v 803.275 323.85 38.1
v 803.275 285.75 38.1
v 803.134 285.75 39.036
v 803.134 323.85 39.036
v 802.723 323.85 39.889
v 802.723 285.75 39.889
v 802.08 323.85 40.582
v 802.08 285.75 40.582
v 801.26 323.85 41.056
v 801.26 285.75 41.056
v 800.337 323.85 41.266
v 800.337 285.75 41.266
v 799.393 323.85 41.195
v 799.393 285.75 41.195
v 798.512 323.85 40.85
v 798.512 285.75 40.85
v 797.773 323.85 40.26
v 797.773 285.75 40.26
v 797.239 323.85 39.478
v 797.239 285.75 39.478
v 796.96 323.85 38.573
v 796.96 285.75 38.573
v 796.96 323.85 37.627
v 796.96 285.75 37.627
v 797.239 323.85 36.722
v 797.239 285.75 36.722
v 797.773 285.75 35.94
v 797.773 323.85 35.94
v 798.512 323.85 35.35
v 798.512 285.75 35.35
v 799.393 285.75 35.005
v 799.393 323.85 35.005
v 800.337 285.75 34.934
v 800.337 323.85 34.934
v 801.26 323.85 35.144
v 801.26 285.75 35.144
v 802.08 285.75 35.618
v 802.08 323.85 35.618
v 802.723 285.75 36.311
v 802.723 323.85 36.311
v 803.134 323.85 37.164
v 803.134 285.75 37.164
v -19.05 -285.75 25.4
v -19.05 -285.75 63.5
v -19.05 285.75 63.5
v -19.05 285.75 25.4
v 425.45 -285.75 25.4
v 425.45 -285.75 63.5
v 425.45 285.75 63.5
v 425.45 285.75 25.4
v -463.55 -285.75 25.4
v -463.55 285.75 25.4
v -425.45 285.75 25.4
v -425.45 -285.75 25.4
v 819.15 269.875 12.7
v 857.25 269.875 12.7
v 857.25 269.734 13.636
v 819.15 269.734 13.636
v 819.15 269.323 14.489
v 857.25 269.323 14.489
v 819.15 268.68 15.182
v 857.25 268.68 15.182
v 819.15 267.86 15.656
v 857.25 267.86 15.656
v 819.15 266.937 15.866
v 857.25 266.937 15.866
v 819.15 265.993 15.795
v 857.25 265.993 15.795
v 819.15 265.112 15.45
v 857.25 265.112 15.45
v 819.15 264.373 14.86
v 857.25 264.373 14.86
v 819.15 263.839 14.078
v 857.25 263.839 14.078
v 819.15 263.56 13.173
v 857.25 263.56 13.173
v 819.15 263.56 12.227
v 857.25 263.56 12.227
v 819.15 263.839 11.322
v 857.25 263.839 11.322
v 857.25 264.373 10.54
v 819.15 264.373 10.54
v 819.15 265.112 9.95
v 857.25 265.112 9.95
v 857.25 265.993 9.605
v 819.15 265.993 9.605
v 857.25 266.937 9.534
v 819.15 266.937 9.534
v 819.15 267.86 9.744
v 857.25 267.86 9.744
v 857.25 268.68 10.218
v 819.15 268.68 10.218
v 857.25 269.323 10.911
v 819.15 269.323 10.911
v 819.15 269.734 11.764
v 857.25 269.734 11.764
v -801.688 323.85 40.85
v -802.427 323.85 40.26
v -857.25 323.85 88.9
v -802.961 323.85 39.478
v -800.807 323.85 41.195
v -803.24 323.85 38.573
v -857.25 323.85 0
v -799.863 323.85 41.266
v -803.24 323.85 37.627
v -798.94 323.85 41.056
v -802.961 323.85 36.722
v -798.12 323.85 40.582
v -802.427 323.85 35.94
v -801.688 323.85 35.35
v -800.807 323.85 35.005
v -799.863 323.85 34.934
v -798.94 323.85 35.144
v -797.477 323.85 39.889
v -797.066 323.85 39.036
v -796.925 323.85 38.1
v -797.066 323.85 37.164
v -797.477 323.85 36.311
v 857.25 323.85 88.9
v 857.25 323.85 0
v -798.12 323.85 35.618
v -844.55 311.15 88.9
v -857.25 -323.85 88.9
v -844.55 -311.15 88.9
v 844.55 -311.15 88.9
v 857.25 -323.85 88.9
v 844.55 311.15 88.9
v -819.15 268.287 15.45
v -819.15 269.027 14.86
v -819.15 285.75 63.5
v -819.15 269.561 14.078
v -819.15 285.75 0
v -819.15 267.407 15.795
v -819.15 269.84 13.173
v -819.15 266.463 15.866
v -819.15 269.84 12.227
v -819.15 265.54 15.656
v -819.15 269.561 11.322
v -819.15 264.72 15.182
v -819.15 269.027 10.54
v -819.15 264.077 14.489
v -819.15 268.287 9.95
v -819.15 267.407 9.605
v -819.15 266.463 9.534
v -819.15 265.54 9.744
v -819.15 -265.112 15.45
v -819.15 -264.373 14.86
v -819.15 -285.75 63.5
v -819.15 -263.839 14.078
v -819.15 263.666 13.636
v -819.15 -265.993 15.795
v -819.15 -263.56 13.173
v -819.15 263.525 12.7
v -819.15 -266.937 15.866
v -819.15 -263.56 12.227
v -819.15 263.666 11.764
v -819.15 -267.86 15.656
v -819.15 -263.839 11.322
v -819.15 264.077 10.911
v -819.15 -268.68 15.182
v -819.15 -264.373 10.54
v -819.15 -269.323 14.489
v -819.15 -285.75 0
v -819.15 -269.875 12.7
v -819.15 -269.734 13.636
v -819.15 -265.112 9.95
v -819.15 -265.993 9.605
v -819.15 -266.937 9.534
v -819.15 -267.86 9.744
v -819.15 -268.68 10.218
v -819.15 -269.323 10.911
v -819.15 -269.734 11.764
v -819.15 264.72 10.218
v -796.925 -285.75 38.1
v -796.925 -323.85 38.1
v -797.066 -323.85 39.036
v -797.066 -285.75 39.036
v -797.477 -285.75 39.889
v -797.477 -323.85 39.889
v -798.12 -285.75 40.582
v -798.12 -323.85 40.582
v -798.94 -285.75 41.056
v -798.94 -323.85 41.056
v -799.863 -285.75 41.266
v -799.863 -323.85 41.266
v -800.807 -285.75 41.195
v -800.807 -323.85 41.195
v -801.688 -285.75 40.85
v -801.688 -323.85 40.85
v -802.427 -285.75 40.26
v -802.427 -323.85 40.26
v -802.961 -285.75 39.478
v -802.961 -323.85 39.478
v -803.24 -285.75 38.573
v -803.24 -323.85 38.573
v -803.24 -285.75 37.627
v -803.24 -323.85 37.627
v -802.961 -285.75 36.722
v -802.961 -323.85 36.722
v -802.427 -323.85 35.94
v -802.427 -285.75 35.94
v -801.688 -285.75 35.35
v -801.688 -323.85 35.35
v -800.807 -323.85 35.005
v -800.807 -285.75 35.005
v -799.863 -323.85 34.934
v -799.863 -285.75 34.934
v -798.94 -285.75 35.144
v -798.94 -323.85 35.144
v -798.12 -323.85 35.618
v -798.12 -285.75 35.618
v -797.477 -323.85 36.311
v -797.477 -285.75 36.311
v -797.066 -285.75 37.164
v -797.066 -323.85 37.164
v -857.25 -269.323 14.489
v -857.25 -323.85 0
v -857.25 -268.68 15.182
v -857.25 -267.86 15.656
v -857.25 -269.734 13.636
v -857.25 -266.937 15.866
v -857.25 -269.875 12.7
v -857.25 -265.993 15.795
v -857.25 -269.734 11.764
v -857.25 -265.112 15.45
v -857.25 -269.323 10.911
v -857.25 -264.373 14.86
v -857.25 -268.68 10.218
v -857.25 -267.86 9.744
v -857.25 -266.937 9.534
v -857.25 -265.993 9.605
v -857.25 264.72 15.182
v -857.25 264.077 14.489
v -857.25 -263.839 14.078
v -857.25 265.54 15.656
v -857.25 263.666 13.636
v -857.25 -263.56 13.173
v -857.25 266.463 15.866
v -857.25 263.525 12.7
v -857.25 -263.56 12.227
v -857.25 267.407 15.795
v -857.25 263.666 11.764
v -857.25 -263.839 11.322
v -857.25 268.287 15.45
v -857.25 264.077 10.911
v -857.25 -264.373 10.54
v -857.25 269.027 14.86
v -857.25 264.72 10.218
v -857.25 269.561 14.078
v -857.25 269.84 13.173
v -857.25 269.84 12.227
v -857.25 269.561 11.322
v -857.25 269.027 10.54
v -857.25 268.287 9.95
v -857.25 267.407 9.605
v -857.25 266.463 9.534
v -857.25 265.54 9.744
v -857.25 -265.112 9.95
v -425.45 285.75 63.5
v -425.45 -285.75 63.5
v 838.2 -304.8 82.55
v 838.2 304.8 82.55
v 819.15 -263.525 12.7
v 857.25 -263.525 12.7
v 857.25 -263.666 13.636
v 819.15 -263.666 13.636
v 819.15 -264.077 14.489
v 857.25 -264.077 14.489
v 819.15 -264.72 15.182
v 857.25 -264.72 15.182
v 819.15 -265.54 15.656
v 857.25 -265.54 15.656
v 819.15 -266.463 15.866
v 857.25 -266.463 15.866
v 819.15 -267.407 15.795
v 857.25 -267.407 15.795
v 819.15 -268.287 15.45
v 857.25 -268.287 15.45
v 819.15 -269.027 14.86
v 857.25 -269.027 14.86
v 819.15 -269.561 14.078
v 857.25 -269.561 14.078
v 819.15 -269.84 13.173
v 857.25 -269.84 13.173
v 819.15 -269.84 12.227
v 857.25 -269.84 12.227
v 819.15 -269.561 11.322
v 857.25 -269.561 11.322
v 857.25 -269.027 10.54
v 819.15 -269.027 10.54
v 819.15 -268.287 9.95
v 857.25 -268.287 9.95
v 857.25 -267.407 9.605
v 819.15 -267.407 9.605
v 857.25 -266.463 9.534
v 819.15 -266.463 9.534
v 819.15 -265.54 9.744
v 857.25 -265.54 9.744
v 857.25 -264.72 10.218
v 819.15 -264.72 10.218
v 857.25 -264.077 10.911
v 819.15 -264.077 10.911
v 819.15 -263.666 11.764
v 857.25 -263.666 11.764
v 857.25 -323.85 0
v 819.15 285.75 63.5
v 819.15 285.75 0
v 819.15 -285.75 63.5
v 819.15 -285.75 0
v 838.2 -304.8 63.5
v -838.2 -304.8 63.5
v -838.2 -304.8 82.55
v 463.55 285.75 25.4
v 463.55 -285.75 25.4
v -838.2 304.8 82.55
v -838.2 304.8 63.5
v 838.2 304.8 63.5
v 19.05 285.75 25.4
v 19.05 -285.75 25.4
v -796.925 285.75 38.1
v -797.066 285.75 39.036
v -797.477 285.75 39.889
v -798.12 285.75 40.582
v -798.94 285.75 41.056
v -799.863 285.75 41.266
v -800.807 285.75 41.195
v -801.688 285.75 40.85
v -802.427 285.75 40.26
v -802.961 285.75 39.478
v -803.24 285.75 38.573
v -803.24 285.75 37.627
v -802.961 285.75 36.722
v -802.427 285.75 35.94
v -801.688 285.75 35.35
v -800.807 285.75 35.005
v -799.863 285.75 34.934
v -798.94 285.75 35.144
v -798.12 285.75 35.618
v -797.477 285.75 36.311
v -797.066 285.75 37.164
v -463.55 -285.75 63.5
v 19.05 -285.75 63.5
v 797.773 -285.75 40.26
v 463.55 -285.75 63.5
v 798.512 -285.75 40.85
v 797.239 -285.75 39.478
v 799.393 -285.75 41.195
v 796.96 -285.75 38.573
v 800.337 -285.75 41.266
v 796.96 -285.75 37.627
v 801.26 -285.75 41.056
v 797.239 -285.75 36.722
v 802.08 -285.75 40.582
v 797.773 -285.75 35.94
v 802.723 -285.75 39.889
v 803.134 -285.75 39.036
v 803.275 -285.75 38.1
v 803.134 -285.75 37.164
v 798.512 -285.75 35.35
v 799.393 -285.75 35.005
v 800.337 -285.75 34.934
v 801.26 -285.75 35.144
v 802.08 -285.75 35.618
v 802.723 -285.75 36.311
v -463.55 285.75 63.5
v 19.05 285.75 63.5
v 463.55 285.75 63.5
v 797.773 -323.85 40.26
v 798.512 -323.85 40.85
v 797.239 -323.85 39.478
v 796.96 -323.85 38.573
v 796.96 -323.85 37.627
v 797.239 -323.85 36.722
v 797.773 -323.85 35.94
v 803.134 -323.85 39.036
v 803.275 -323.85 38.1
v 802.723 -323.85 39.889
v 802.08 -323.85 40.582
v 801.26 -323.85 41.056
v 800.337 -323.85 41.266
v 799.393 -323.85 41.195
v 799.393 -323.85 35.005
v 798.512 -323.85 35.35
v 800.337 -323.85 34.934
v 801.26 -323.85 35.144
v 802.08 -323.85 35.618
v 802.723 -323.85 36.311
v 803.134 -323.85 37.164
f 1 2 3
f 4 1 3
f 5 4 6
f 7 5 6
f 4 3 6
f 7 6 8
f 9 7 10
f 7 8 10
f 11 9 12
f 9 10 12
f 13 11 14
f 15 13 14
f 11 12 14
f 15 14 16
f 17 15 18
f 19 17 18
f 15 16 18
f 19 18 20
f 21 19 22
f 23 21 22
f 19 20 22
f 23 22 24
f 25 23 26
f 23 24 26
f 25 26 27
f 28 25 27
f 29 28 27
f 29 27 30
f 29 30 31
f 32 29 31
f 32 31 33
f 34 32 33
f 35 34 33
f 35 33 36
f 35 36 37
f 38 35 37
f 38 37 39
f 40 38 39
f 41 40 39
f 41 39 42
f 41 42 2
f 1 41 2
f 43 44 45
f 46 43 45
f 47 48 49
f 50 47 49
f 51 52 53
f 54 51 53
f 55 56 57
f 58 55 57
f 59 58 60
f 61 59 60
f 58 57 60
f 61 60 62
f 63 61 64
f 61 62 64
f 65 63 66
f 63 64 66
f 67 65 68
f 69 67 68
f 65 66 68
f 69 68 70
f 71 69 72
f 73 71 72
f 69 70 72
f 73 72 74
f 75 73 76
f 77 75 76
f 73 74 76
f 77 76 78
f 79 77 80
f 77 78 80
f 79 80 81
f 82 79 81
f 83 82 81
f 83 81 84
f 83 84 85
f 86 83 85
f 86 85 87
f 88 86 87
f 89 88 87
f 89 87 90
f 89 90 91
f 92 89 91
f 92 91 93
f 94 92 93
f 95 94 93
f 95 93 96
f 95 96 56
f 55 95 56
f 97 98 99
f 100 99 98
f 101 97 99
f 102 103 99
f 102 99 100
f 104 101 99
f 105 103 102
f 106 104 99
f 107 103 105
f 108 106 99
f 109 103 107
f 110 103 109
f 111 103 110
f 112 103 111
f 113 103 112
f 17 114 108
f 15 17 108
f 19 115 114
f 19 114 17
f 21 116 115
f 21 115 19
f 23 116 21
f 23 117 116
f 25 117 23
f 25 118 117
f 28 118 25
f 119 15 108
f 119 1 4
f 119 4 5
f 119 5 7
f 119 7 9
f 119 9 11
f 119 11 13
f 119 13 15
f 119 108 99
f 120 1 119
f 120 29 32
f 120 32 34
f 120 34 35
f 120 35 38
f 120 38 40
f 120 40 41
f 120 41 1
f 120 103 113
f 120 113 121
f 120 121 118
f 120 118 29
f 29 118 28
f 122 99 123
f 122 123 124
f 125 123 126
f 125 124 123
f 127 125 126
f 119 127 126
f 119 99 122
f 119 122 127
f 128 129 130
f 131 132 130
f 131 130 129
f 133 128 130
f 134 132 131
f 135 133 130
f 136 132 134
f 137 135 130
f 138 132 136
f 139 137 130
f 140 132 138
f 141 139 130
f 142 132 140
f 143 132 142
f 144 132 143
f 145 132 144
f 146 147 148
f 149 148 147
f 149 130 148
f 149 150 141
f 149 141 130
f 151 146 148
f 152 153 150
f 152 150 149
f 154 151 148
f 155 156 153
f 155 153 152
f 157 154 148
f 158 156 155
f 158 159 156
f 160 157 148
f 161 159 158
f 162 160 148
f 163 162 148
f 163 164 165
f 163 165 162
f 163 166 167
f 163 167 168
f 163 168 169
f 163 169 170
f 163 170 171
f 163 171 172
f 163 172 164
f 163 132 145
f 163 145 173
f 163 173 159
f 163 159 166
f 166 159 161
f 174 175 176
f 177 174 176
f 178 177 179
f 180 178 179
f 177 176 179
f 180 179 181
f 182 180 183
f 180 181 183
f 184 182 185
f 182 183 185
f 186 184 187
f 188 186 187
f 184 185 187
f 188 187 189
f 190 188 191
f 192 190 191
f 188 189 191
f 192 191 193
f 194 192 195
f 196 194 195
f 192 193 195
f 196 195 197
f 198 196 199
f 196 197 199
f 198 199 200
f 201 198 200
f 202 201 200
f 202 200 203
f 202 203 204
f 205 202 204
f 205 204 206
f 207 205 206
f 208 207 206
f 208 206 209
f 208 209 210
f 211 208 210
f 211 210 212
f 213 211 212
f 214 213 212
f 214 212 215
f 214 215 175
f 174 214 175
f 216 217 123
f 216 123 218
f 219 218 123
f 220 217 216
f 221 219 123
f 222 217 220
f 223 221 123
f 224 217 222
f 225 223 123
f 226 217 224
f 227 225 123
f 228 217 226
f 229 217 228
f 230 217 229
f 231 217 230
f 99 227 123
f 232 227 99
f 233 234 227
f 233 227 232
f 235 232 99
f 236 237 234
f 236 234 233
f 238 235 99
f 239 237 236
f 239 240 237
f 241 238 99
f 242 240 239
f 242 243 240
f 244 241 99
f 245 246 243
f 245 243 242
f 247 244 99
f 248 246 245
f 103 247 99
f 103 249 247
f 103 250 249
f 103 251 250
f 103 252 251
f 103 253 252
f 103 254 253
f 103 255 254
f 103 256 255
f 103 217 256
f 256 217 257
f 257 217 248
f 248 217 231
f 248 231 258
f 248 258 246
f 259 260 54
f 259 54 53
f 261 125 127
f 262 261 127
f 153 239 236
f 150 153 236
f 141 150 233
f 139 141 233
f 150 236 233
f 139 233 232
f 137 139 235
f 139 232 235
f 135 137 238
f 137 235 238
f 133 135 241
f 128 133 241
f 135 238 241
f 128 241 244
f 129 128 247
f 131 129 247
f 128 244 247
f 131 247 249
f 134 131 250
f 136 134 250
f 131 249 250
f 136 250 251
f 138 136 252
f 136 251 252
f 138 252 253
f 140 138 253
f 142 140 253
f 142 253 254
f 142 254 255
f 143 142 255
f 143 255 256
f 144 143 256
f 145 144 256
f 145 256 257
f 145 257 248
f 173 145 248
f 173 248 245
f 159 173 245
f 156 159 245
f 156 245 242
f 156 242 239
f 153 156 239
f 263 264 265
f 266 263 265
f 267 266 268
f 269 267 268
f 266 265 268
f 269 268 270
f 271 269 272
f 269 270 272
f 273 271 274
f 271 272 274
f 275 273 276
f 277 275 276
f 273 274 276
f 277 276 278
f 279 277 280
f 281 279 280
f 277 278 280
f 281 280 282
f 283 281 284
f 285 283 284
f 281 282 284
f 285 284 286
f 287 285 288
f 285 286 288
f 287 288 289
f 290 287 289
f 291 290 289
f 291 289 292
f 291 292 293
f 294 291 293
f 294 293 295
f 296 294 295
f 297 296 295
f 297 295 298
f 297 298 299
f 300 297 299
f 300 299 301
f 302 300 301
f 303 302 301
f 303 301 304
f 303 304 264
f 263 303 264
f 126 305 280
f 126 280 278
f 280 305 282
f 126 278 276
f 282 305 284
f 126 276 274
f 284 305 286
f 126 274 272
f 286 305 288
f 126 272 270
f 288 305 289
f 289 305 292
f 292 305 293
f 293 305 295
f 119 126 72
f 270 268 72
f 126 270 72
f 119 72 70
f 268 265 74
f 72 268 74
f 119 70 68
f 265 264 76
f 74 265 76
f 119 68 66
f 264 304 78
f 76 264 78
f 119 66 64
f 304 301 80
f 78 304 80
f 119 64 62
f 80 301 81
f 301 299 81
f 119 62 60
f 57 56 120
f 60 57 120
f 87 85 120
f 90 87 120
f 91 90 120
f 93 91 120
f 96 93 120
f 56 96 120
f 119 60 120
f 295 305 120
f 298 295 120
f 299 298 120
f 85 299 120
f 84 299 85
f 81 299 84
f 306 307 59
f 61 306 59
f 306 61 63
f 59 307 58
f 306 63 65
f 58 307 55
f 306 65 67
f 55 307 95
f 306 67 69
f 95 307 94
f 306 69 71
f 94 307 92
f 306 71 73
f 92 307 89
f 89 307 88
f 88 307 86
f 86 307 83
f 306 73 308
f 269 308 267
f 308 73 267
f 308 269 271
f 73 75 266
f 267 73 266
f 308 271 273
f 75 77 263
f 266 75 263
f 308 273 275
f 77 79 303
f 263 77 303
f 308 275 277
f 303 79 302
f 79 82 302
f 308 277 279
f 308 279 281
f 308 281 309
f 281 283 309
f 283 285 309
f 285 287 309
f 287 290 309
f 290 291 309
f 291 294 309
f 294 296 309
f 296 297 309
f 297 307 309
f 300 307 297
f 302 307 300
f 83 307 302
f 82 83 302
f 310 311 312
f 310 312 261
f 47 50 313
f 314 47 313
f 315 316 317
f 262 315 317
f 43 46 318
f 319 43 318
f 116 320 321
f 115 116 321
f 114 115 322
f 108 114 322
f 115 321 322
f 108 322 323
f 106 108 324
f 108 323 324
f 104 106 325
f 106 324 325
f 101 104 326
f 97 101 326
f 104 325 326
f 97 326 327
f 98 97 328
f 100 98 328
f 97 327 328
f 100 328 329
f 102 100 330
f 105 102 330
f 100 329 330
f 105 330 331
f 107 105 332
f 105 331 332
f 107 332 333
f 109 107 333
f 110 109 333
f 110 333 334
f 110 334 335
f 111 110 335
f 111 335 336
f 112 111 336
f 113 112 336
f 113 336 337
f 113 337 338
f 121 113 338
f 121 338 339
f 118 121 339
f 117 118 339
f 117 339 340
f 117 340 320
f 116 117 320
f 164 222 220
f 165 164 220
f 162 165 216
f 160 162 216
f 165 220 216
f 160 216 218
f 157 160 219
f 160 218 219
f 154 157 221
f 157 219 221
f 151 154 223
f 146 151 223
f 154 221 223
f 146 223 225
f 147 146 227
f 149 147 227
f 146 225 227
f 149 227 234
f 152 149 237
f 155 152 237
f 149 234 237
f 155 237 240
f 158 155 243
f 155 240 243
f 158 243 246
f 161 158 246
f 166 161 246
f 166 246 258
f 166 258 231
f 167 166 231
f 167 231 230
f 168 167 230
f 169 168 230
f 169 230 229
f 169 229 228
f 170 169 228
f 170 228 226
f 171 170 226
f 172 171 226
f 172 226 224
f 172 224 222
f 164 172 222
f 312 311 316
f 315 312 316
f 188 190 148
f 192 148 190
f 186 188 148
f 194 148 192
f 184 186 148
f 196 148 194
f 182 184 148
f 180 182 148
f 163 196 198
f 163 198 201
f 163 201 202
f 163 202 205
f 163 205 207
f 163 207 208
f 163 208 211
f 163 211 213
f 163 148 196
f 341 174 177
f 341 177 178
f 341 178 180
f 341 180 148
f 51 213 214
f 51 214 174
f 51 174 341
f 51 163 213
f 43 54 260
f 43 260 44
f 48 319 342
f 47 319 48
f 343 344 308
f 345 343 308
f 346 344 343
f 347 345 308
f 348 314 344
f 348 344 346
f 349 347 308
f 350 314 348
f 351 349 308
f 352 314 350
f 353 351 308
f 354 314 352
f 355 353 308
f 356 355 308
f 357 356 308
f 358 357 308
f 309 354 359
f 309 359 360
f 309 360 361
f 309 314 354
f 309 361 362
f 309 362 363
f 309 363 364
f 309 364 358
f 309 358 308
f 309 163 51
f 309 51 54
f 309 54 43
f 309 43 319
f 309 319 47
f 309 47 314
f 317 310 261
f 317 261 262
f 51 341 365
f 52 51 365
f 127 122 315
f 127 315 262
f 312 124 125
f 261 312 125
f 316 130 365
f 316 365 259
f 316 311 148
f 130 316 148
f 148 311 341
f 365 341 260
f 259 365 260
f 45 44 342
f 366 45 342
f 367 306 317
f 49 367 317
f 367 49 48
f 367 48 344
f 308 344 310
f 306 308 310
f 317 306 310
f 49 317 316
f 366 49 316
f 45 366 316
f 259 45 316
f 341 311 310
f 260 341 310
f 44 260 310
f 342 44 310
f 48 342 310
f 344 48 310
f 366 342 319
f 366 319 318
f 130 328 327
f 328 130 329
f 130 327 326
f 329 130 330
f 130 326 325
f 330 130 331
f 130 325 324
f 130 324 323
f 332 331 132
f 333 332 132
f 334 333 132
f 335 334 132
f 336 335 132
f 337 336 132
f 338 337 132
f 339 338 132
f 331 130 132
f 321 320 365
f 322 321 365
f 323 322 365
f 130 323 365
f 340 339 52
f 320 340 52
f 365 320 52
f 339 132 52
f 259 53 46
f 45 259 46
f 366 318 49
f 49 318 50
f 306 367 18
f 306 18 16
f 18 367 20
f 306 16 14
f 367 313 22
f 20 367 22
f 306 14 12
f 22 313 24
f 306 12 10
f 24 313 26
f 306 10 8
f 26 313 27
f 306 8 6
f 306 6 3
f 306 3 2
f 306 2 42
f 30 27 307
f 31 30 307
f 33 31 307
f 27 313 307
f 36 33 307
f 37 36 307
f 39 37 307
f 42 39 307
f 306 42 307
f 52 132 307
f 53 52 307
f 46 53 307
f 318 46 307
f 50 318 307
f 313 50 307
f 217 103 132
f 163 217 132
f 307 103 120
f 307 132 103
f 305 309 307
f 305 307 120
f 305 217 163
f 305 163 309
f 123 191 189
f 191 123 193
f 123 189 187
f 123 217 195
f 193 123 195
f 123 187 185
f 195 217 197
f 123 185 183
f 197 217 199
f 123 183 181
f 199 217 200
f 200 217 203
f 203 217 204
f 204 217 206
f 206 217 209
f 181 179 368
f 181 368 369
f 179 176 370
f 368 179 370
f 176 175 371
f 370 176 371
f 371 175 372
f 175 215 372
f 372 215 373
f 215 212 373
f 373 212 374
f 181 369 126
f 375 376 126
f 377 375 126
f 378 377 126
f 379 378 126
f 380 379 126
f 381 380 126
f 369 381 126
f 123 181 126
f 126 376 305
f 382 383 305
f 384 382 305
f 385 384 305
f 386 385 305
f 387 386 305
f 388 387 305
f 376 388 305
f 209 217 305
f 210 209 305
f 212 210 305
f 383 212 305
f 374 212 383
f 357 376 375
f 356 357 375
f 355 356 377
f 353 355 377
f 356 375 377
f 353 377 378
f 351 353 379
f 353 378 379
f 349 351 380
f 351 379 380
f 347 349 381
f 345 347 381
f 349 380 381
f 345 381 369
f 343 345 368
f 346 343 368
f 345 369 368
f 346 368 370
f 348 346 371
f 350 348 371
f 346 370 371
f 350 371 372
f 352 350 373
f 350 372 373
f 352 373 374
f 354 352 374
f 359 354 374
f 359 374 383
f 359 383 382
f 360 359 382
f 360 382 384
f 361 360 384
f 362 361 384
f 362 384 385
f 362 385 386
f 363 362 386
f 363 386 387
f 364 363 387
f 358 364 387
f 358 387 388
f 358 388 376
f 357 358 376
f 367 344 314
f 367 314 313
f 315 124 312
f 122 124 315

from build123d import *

# Parameters (mm, degrees)
F0_W      = 1714.5
F0_H      = 647.7
F0_W_2    = 1676.4
F0_H_2    = 609.6
F1_DEPTH  = 88.9
F2_W      = 1676.4
F2_H      = 609.6
F2_W_2    = 1638.3
F2_H_2    = 571.5
F3_DEPTH  = 63.5
F4_W      = 38.1
F4_H      = 571.5
F5_DEPTH  = 38.1
F6_R      = 3.175
F7_DEPTH  = 647.701
F8_R      = 3.175
F9_DEPTH  = 50.8
F10_R     = 3.175
F11_DEPTH = 50.8
F12_SIZE  = 6.35


with BuildPart() as f1:
    # F0 (on Top) → F1 (new body)
    with BuildSketch(Plane.XY):
        Rectangle(F0_W, F0_H)
        Rectangle(F0_W_2, F0_H_2, mode=Mode.SUBTRACT)
    extrude(amount=F1_DEPTH)

    # F2 (on face) → F3 (join)
    with BuildSketch(Plane(origin=(0, 0, 0), x_dir=(1, 0, 0), z_dir=(0, 0, -1))):
        Rectangle(F2_W, F2_H)
        Rectangle(F2_W_2, F2_H_2, mode=Mode.SUBTRACT)
    extrude(amount=-F3_DEPTH)

    # F4 (on face) → F5 (join)
    with BuildSketch(Plane.XY.offset(63.5)):
        Rectangle(F4_W, F4_H)
        with Locations((444.5, 0)):
            Rectangle(F4_W, F4_H)
        with Locations((-444.5, 0)):
            Rectangle(F4_W, F4_H)
    extrude(amount=-F5_DEPTH)

    # F6 (on face) → F7 (cut, through all)
    with BuildSketch(Plane.XZ.offset(323.85)):
        with Locations((-800.1, 38.1)):
            Circle(F6_R)
        with Locations((800.1, 38.1)):
            Circle(F6_R)
    extrude(amount=-F7_DEPTH, mode=Mode.SUBTRACT)

    # F8 (on face) → F9 (cut)
    with BuildSketch(Plane.YZ.offset(857.25)):
        with Locations((-266.7, 12.7)):
            Circle(F8_R)
        with Locations((266.7, 12.7)):
            Circle(F8_R)
    extrude(amount=-F9_DEPTH, mode=Mode.SUBTRACT)

    # F10 (on face) → F11 (cut)
    with BuildSketch(Plane(origin=(-857.25, 0, 0), x_dir=(0, -1, 0), z_dir=(-1, 0, 0))):
        with Locations((-266.7, 12.7)):
            Circle(F10_R)
        with Locations((266.7, 12.7)):
            Circle(F10_R)
    extrude(amount=-F11_DEPTH, mode=Mode.SUBTRACT)

    # F12
    f12_edges = [f1.edges().sort_by_distance(p)[0] for p in [
        (0, 304.8, 88.9),
        (838.2, 0, 88.9),
        (-838.2, 0, 88.9),
        (0, -304.8, 88.9),
    ]]
    chamfer(f12_edges, length=F12_SIZE)


solid = f1.part
